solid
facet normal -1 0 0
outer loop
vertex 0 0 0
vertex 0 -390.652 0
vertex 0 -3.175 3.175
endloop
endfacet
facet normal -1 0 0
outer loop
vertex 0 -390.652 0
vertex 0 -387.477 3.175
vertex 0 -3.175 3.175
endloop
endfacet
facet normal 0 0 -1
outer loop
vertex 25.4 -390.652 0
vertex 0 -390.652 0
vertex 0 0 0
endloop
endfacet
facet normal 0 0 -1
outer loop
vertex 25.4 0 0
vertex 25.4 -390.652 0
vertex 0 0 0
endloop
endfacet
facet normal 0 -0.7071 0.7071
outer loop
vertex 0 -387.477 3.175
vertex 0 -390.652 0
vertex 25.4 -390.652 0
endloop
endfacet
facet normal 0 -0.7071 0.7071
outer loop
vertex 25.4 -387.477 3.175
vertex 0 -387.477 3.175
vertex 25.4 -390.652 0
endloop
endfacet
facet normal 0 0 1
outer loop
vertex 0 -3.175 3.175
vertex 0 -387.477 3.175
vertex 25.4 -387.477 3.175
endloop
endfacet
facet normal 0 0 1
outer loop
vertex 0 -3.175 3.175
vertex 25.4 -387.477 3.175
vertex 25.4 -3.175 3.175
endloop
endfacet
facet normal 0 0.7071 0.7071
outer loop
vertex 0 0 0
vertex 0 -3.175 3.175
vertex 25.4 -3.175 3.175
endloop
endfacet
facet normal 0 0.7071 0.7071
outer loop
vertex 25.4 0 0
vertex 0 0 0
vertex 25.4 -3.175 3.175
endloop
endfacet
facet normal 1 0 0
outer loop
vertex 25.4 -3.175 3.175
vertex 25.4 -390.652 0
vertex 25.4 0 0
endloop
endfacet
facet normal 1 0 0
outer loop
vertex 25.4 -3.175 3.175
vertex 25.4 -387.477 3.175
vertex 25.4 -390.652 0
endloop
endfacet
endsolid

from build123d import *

# Parameters (mm, degrees)
F0_W     = 390.652
F0_H     = 3.175
F1_DEPTH = 25.4
F2_SIZE  = 3.17499
F3_SIZE  = 3.17499


# Not quite as in the source:
# - a fillet or chamfer is up to 0.001 mm smaller than in the source, because OpenCascade refuses the exact size


with BuildPart() as f1:
    # F0 (on Right) → F1 (new body)
    with BuildSketch(Plane.YZ):
        with Locations((-195.326, 1.5875)):
            Rectangle(F0_W, F0_H)
    extrude(amount=F1_DEPTH)

    # F2 (size 3.175 in the source; OpenCascade refuses exactly that, so slightly less here)
    f2_edges = [f1.edges().sort_by_distance(p)[0] for p in [
        (12.7, 0, 3.175),
    ]]
    chamfer(f2_edges, length=F2_SIZE)

    # F3 (size 3.175 in the source; OpenCascade refuses exactly that, so slightly less here)
    f3_edges = [f1.edges().sort_by_distance(p)[0] for p in [
        (12.7, -390.652, 3.175),
    ]]
    chamfer(f3_edges, length=F3_SIZE)


solid = f1.part
